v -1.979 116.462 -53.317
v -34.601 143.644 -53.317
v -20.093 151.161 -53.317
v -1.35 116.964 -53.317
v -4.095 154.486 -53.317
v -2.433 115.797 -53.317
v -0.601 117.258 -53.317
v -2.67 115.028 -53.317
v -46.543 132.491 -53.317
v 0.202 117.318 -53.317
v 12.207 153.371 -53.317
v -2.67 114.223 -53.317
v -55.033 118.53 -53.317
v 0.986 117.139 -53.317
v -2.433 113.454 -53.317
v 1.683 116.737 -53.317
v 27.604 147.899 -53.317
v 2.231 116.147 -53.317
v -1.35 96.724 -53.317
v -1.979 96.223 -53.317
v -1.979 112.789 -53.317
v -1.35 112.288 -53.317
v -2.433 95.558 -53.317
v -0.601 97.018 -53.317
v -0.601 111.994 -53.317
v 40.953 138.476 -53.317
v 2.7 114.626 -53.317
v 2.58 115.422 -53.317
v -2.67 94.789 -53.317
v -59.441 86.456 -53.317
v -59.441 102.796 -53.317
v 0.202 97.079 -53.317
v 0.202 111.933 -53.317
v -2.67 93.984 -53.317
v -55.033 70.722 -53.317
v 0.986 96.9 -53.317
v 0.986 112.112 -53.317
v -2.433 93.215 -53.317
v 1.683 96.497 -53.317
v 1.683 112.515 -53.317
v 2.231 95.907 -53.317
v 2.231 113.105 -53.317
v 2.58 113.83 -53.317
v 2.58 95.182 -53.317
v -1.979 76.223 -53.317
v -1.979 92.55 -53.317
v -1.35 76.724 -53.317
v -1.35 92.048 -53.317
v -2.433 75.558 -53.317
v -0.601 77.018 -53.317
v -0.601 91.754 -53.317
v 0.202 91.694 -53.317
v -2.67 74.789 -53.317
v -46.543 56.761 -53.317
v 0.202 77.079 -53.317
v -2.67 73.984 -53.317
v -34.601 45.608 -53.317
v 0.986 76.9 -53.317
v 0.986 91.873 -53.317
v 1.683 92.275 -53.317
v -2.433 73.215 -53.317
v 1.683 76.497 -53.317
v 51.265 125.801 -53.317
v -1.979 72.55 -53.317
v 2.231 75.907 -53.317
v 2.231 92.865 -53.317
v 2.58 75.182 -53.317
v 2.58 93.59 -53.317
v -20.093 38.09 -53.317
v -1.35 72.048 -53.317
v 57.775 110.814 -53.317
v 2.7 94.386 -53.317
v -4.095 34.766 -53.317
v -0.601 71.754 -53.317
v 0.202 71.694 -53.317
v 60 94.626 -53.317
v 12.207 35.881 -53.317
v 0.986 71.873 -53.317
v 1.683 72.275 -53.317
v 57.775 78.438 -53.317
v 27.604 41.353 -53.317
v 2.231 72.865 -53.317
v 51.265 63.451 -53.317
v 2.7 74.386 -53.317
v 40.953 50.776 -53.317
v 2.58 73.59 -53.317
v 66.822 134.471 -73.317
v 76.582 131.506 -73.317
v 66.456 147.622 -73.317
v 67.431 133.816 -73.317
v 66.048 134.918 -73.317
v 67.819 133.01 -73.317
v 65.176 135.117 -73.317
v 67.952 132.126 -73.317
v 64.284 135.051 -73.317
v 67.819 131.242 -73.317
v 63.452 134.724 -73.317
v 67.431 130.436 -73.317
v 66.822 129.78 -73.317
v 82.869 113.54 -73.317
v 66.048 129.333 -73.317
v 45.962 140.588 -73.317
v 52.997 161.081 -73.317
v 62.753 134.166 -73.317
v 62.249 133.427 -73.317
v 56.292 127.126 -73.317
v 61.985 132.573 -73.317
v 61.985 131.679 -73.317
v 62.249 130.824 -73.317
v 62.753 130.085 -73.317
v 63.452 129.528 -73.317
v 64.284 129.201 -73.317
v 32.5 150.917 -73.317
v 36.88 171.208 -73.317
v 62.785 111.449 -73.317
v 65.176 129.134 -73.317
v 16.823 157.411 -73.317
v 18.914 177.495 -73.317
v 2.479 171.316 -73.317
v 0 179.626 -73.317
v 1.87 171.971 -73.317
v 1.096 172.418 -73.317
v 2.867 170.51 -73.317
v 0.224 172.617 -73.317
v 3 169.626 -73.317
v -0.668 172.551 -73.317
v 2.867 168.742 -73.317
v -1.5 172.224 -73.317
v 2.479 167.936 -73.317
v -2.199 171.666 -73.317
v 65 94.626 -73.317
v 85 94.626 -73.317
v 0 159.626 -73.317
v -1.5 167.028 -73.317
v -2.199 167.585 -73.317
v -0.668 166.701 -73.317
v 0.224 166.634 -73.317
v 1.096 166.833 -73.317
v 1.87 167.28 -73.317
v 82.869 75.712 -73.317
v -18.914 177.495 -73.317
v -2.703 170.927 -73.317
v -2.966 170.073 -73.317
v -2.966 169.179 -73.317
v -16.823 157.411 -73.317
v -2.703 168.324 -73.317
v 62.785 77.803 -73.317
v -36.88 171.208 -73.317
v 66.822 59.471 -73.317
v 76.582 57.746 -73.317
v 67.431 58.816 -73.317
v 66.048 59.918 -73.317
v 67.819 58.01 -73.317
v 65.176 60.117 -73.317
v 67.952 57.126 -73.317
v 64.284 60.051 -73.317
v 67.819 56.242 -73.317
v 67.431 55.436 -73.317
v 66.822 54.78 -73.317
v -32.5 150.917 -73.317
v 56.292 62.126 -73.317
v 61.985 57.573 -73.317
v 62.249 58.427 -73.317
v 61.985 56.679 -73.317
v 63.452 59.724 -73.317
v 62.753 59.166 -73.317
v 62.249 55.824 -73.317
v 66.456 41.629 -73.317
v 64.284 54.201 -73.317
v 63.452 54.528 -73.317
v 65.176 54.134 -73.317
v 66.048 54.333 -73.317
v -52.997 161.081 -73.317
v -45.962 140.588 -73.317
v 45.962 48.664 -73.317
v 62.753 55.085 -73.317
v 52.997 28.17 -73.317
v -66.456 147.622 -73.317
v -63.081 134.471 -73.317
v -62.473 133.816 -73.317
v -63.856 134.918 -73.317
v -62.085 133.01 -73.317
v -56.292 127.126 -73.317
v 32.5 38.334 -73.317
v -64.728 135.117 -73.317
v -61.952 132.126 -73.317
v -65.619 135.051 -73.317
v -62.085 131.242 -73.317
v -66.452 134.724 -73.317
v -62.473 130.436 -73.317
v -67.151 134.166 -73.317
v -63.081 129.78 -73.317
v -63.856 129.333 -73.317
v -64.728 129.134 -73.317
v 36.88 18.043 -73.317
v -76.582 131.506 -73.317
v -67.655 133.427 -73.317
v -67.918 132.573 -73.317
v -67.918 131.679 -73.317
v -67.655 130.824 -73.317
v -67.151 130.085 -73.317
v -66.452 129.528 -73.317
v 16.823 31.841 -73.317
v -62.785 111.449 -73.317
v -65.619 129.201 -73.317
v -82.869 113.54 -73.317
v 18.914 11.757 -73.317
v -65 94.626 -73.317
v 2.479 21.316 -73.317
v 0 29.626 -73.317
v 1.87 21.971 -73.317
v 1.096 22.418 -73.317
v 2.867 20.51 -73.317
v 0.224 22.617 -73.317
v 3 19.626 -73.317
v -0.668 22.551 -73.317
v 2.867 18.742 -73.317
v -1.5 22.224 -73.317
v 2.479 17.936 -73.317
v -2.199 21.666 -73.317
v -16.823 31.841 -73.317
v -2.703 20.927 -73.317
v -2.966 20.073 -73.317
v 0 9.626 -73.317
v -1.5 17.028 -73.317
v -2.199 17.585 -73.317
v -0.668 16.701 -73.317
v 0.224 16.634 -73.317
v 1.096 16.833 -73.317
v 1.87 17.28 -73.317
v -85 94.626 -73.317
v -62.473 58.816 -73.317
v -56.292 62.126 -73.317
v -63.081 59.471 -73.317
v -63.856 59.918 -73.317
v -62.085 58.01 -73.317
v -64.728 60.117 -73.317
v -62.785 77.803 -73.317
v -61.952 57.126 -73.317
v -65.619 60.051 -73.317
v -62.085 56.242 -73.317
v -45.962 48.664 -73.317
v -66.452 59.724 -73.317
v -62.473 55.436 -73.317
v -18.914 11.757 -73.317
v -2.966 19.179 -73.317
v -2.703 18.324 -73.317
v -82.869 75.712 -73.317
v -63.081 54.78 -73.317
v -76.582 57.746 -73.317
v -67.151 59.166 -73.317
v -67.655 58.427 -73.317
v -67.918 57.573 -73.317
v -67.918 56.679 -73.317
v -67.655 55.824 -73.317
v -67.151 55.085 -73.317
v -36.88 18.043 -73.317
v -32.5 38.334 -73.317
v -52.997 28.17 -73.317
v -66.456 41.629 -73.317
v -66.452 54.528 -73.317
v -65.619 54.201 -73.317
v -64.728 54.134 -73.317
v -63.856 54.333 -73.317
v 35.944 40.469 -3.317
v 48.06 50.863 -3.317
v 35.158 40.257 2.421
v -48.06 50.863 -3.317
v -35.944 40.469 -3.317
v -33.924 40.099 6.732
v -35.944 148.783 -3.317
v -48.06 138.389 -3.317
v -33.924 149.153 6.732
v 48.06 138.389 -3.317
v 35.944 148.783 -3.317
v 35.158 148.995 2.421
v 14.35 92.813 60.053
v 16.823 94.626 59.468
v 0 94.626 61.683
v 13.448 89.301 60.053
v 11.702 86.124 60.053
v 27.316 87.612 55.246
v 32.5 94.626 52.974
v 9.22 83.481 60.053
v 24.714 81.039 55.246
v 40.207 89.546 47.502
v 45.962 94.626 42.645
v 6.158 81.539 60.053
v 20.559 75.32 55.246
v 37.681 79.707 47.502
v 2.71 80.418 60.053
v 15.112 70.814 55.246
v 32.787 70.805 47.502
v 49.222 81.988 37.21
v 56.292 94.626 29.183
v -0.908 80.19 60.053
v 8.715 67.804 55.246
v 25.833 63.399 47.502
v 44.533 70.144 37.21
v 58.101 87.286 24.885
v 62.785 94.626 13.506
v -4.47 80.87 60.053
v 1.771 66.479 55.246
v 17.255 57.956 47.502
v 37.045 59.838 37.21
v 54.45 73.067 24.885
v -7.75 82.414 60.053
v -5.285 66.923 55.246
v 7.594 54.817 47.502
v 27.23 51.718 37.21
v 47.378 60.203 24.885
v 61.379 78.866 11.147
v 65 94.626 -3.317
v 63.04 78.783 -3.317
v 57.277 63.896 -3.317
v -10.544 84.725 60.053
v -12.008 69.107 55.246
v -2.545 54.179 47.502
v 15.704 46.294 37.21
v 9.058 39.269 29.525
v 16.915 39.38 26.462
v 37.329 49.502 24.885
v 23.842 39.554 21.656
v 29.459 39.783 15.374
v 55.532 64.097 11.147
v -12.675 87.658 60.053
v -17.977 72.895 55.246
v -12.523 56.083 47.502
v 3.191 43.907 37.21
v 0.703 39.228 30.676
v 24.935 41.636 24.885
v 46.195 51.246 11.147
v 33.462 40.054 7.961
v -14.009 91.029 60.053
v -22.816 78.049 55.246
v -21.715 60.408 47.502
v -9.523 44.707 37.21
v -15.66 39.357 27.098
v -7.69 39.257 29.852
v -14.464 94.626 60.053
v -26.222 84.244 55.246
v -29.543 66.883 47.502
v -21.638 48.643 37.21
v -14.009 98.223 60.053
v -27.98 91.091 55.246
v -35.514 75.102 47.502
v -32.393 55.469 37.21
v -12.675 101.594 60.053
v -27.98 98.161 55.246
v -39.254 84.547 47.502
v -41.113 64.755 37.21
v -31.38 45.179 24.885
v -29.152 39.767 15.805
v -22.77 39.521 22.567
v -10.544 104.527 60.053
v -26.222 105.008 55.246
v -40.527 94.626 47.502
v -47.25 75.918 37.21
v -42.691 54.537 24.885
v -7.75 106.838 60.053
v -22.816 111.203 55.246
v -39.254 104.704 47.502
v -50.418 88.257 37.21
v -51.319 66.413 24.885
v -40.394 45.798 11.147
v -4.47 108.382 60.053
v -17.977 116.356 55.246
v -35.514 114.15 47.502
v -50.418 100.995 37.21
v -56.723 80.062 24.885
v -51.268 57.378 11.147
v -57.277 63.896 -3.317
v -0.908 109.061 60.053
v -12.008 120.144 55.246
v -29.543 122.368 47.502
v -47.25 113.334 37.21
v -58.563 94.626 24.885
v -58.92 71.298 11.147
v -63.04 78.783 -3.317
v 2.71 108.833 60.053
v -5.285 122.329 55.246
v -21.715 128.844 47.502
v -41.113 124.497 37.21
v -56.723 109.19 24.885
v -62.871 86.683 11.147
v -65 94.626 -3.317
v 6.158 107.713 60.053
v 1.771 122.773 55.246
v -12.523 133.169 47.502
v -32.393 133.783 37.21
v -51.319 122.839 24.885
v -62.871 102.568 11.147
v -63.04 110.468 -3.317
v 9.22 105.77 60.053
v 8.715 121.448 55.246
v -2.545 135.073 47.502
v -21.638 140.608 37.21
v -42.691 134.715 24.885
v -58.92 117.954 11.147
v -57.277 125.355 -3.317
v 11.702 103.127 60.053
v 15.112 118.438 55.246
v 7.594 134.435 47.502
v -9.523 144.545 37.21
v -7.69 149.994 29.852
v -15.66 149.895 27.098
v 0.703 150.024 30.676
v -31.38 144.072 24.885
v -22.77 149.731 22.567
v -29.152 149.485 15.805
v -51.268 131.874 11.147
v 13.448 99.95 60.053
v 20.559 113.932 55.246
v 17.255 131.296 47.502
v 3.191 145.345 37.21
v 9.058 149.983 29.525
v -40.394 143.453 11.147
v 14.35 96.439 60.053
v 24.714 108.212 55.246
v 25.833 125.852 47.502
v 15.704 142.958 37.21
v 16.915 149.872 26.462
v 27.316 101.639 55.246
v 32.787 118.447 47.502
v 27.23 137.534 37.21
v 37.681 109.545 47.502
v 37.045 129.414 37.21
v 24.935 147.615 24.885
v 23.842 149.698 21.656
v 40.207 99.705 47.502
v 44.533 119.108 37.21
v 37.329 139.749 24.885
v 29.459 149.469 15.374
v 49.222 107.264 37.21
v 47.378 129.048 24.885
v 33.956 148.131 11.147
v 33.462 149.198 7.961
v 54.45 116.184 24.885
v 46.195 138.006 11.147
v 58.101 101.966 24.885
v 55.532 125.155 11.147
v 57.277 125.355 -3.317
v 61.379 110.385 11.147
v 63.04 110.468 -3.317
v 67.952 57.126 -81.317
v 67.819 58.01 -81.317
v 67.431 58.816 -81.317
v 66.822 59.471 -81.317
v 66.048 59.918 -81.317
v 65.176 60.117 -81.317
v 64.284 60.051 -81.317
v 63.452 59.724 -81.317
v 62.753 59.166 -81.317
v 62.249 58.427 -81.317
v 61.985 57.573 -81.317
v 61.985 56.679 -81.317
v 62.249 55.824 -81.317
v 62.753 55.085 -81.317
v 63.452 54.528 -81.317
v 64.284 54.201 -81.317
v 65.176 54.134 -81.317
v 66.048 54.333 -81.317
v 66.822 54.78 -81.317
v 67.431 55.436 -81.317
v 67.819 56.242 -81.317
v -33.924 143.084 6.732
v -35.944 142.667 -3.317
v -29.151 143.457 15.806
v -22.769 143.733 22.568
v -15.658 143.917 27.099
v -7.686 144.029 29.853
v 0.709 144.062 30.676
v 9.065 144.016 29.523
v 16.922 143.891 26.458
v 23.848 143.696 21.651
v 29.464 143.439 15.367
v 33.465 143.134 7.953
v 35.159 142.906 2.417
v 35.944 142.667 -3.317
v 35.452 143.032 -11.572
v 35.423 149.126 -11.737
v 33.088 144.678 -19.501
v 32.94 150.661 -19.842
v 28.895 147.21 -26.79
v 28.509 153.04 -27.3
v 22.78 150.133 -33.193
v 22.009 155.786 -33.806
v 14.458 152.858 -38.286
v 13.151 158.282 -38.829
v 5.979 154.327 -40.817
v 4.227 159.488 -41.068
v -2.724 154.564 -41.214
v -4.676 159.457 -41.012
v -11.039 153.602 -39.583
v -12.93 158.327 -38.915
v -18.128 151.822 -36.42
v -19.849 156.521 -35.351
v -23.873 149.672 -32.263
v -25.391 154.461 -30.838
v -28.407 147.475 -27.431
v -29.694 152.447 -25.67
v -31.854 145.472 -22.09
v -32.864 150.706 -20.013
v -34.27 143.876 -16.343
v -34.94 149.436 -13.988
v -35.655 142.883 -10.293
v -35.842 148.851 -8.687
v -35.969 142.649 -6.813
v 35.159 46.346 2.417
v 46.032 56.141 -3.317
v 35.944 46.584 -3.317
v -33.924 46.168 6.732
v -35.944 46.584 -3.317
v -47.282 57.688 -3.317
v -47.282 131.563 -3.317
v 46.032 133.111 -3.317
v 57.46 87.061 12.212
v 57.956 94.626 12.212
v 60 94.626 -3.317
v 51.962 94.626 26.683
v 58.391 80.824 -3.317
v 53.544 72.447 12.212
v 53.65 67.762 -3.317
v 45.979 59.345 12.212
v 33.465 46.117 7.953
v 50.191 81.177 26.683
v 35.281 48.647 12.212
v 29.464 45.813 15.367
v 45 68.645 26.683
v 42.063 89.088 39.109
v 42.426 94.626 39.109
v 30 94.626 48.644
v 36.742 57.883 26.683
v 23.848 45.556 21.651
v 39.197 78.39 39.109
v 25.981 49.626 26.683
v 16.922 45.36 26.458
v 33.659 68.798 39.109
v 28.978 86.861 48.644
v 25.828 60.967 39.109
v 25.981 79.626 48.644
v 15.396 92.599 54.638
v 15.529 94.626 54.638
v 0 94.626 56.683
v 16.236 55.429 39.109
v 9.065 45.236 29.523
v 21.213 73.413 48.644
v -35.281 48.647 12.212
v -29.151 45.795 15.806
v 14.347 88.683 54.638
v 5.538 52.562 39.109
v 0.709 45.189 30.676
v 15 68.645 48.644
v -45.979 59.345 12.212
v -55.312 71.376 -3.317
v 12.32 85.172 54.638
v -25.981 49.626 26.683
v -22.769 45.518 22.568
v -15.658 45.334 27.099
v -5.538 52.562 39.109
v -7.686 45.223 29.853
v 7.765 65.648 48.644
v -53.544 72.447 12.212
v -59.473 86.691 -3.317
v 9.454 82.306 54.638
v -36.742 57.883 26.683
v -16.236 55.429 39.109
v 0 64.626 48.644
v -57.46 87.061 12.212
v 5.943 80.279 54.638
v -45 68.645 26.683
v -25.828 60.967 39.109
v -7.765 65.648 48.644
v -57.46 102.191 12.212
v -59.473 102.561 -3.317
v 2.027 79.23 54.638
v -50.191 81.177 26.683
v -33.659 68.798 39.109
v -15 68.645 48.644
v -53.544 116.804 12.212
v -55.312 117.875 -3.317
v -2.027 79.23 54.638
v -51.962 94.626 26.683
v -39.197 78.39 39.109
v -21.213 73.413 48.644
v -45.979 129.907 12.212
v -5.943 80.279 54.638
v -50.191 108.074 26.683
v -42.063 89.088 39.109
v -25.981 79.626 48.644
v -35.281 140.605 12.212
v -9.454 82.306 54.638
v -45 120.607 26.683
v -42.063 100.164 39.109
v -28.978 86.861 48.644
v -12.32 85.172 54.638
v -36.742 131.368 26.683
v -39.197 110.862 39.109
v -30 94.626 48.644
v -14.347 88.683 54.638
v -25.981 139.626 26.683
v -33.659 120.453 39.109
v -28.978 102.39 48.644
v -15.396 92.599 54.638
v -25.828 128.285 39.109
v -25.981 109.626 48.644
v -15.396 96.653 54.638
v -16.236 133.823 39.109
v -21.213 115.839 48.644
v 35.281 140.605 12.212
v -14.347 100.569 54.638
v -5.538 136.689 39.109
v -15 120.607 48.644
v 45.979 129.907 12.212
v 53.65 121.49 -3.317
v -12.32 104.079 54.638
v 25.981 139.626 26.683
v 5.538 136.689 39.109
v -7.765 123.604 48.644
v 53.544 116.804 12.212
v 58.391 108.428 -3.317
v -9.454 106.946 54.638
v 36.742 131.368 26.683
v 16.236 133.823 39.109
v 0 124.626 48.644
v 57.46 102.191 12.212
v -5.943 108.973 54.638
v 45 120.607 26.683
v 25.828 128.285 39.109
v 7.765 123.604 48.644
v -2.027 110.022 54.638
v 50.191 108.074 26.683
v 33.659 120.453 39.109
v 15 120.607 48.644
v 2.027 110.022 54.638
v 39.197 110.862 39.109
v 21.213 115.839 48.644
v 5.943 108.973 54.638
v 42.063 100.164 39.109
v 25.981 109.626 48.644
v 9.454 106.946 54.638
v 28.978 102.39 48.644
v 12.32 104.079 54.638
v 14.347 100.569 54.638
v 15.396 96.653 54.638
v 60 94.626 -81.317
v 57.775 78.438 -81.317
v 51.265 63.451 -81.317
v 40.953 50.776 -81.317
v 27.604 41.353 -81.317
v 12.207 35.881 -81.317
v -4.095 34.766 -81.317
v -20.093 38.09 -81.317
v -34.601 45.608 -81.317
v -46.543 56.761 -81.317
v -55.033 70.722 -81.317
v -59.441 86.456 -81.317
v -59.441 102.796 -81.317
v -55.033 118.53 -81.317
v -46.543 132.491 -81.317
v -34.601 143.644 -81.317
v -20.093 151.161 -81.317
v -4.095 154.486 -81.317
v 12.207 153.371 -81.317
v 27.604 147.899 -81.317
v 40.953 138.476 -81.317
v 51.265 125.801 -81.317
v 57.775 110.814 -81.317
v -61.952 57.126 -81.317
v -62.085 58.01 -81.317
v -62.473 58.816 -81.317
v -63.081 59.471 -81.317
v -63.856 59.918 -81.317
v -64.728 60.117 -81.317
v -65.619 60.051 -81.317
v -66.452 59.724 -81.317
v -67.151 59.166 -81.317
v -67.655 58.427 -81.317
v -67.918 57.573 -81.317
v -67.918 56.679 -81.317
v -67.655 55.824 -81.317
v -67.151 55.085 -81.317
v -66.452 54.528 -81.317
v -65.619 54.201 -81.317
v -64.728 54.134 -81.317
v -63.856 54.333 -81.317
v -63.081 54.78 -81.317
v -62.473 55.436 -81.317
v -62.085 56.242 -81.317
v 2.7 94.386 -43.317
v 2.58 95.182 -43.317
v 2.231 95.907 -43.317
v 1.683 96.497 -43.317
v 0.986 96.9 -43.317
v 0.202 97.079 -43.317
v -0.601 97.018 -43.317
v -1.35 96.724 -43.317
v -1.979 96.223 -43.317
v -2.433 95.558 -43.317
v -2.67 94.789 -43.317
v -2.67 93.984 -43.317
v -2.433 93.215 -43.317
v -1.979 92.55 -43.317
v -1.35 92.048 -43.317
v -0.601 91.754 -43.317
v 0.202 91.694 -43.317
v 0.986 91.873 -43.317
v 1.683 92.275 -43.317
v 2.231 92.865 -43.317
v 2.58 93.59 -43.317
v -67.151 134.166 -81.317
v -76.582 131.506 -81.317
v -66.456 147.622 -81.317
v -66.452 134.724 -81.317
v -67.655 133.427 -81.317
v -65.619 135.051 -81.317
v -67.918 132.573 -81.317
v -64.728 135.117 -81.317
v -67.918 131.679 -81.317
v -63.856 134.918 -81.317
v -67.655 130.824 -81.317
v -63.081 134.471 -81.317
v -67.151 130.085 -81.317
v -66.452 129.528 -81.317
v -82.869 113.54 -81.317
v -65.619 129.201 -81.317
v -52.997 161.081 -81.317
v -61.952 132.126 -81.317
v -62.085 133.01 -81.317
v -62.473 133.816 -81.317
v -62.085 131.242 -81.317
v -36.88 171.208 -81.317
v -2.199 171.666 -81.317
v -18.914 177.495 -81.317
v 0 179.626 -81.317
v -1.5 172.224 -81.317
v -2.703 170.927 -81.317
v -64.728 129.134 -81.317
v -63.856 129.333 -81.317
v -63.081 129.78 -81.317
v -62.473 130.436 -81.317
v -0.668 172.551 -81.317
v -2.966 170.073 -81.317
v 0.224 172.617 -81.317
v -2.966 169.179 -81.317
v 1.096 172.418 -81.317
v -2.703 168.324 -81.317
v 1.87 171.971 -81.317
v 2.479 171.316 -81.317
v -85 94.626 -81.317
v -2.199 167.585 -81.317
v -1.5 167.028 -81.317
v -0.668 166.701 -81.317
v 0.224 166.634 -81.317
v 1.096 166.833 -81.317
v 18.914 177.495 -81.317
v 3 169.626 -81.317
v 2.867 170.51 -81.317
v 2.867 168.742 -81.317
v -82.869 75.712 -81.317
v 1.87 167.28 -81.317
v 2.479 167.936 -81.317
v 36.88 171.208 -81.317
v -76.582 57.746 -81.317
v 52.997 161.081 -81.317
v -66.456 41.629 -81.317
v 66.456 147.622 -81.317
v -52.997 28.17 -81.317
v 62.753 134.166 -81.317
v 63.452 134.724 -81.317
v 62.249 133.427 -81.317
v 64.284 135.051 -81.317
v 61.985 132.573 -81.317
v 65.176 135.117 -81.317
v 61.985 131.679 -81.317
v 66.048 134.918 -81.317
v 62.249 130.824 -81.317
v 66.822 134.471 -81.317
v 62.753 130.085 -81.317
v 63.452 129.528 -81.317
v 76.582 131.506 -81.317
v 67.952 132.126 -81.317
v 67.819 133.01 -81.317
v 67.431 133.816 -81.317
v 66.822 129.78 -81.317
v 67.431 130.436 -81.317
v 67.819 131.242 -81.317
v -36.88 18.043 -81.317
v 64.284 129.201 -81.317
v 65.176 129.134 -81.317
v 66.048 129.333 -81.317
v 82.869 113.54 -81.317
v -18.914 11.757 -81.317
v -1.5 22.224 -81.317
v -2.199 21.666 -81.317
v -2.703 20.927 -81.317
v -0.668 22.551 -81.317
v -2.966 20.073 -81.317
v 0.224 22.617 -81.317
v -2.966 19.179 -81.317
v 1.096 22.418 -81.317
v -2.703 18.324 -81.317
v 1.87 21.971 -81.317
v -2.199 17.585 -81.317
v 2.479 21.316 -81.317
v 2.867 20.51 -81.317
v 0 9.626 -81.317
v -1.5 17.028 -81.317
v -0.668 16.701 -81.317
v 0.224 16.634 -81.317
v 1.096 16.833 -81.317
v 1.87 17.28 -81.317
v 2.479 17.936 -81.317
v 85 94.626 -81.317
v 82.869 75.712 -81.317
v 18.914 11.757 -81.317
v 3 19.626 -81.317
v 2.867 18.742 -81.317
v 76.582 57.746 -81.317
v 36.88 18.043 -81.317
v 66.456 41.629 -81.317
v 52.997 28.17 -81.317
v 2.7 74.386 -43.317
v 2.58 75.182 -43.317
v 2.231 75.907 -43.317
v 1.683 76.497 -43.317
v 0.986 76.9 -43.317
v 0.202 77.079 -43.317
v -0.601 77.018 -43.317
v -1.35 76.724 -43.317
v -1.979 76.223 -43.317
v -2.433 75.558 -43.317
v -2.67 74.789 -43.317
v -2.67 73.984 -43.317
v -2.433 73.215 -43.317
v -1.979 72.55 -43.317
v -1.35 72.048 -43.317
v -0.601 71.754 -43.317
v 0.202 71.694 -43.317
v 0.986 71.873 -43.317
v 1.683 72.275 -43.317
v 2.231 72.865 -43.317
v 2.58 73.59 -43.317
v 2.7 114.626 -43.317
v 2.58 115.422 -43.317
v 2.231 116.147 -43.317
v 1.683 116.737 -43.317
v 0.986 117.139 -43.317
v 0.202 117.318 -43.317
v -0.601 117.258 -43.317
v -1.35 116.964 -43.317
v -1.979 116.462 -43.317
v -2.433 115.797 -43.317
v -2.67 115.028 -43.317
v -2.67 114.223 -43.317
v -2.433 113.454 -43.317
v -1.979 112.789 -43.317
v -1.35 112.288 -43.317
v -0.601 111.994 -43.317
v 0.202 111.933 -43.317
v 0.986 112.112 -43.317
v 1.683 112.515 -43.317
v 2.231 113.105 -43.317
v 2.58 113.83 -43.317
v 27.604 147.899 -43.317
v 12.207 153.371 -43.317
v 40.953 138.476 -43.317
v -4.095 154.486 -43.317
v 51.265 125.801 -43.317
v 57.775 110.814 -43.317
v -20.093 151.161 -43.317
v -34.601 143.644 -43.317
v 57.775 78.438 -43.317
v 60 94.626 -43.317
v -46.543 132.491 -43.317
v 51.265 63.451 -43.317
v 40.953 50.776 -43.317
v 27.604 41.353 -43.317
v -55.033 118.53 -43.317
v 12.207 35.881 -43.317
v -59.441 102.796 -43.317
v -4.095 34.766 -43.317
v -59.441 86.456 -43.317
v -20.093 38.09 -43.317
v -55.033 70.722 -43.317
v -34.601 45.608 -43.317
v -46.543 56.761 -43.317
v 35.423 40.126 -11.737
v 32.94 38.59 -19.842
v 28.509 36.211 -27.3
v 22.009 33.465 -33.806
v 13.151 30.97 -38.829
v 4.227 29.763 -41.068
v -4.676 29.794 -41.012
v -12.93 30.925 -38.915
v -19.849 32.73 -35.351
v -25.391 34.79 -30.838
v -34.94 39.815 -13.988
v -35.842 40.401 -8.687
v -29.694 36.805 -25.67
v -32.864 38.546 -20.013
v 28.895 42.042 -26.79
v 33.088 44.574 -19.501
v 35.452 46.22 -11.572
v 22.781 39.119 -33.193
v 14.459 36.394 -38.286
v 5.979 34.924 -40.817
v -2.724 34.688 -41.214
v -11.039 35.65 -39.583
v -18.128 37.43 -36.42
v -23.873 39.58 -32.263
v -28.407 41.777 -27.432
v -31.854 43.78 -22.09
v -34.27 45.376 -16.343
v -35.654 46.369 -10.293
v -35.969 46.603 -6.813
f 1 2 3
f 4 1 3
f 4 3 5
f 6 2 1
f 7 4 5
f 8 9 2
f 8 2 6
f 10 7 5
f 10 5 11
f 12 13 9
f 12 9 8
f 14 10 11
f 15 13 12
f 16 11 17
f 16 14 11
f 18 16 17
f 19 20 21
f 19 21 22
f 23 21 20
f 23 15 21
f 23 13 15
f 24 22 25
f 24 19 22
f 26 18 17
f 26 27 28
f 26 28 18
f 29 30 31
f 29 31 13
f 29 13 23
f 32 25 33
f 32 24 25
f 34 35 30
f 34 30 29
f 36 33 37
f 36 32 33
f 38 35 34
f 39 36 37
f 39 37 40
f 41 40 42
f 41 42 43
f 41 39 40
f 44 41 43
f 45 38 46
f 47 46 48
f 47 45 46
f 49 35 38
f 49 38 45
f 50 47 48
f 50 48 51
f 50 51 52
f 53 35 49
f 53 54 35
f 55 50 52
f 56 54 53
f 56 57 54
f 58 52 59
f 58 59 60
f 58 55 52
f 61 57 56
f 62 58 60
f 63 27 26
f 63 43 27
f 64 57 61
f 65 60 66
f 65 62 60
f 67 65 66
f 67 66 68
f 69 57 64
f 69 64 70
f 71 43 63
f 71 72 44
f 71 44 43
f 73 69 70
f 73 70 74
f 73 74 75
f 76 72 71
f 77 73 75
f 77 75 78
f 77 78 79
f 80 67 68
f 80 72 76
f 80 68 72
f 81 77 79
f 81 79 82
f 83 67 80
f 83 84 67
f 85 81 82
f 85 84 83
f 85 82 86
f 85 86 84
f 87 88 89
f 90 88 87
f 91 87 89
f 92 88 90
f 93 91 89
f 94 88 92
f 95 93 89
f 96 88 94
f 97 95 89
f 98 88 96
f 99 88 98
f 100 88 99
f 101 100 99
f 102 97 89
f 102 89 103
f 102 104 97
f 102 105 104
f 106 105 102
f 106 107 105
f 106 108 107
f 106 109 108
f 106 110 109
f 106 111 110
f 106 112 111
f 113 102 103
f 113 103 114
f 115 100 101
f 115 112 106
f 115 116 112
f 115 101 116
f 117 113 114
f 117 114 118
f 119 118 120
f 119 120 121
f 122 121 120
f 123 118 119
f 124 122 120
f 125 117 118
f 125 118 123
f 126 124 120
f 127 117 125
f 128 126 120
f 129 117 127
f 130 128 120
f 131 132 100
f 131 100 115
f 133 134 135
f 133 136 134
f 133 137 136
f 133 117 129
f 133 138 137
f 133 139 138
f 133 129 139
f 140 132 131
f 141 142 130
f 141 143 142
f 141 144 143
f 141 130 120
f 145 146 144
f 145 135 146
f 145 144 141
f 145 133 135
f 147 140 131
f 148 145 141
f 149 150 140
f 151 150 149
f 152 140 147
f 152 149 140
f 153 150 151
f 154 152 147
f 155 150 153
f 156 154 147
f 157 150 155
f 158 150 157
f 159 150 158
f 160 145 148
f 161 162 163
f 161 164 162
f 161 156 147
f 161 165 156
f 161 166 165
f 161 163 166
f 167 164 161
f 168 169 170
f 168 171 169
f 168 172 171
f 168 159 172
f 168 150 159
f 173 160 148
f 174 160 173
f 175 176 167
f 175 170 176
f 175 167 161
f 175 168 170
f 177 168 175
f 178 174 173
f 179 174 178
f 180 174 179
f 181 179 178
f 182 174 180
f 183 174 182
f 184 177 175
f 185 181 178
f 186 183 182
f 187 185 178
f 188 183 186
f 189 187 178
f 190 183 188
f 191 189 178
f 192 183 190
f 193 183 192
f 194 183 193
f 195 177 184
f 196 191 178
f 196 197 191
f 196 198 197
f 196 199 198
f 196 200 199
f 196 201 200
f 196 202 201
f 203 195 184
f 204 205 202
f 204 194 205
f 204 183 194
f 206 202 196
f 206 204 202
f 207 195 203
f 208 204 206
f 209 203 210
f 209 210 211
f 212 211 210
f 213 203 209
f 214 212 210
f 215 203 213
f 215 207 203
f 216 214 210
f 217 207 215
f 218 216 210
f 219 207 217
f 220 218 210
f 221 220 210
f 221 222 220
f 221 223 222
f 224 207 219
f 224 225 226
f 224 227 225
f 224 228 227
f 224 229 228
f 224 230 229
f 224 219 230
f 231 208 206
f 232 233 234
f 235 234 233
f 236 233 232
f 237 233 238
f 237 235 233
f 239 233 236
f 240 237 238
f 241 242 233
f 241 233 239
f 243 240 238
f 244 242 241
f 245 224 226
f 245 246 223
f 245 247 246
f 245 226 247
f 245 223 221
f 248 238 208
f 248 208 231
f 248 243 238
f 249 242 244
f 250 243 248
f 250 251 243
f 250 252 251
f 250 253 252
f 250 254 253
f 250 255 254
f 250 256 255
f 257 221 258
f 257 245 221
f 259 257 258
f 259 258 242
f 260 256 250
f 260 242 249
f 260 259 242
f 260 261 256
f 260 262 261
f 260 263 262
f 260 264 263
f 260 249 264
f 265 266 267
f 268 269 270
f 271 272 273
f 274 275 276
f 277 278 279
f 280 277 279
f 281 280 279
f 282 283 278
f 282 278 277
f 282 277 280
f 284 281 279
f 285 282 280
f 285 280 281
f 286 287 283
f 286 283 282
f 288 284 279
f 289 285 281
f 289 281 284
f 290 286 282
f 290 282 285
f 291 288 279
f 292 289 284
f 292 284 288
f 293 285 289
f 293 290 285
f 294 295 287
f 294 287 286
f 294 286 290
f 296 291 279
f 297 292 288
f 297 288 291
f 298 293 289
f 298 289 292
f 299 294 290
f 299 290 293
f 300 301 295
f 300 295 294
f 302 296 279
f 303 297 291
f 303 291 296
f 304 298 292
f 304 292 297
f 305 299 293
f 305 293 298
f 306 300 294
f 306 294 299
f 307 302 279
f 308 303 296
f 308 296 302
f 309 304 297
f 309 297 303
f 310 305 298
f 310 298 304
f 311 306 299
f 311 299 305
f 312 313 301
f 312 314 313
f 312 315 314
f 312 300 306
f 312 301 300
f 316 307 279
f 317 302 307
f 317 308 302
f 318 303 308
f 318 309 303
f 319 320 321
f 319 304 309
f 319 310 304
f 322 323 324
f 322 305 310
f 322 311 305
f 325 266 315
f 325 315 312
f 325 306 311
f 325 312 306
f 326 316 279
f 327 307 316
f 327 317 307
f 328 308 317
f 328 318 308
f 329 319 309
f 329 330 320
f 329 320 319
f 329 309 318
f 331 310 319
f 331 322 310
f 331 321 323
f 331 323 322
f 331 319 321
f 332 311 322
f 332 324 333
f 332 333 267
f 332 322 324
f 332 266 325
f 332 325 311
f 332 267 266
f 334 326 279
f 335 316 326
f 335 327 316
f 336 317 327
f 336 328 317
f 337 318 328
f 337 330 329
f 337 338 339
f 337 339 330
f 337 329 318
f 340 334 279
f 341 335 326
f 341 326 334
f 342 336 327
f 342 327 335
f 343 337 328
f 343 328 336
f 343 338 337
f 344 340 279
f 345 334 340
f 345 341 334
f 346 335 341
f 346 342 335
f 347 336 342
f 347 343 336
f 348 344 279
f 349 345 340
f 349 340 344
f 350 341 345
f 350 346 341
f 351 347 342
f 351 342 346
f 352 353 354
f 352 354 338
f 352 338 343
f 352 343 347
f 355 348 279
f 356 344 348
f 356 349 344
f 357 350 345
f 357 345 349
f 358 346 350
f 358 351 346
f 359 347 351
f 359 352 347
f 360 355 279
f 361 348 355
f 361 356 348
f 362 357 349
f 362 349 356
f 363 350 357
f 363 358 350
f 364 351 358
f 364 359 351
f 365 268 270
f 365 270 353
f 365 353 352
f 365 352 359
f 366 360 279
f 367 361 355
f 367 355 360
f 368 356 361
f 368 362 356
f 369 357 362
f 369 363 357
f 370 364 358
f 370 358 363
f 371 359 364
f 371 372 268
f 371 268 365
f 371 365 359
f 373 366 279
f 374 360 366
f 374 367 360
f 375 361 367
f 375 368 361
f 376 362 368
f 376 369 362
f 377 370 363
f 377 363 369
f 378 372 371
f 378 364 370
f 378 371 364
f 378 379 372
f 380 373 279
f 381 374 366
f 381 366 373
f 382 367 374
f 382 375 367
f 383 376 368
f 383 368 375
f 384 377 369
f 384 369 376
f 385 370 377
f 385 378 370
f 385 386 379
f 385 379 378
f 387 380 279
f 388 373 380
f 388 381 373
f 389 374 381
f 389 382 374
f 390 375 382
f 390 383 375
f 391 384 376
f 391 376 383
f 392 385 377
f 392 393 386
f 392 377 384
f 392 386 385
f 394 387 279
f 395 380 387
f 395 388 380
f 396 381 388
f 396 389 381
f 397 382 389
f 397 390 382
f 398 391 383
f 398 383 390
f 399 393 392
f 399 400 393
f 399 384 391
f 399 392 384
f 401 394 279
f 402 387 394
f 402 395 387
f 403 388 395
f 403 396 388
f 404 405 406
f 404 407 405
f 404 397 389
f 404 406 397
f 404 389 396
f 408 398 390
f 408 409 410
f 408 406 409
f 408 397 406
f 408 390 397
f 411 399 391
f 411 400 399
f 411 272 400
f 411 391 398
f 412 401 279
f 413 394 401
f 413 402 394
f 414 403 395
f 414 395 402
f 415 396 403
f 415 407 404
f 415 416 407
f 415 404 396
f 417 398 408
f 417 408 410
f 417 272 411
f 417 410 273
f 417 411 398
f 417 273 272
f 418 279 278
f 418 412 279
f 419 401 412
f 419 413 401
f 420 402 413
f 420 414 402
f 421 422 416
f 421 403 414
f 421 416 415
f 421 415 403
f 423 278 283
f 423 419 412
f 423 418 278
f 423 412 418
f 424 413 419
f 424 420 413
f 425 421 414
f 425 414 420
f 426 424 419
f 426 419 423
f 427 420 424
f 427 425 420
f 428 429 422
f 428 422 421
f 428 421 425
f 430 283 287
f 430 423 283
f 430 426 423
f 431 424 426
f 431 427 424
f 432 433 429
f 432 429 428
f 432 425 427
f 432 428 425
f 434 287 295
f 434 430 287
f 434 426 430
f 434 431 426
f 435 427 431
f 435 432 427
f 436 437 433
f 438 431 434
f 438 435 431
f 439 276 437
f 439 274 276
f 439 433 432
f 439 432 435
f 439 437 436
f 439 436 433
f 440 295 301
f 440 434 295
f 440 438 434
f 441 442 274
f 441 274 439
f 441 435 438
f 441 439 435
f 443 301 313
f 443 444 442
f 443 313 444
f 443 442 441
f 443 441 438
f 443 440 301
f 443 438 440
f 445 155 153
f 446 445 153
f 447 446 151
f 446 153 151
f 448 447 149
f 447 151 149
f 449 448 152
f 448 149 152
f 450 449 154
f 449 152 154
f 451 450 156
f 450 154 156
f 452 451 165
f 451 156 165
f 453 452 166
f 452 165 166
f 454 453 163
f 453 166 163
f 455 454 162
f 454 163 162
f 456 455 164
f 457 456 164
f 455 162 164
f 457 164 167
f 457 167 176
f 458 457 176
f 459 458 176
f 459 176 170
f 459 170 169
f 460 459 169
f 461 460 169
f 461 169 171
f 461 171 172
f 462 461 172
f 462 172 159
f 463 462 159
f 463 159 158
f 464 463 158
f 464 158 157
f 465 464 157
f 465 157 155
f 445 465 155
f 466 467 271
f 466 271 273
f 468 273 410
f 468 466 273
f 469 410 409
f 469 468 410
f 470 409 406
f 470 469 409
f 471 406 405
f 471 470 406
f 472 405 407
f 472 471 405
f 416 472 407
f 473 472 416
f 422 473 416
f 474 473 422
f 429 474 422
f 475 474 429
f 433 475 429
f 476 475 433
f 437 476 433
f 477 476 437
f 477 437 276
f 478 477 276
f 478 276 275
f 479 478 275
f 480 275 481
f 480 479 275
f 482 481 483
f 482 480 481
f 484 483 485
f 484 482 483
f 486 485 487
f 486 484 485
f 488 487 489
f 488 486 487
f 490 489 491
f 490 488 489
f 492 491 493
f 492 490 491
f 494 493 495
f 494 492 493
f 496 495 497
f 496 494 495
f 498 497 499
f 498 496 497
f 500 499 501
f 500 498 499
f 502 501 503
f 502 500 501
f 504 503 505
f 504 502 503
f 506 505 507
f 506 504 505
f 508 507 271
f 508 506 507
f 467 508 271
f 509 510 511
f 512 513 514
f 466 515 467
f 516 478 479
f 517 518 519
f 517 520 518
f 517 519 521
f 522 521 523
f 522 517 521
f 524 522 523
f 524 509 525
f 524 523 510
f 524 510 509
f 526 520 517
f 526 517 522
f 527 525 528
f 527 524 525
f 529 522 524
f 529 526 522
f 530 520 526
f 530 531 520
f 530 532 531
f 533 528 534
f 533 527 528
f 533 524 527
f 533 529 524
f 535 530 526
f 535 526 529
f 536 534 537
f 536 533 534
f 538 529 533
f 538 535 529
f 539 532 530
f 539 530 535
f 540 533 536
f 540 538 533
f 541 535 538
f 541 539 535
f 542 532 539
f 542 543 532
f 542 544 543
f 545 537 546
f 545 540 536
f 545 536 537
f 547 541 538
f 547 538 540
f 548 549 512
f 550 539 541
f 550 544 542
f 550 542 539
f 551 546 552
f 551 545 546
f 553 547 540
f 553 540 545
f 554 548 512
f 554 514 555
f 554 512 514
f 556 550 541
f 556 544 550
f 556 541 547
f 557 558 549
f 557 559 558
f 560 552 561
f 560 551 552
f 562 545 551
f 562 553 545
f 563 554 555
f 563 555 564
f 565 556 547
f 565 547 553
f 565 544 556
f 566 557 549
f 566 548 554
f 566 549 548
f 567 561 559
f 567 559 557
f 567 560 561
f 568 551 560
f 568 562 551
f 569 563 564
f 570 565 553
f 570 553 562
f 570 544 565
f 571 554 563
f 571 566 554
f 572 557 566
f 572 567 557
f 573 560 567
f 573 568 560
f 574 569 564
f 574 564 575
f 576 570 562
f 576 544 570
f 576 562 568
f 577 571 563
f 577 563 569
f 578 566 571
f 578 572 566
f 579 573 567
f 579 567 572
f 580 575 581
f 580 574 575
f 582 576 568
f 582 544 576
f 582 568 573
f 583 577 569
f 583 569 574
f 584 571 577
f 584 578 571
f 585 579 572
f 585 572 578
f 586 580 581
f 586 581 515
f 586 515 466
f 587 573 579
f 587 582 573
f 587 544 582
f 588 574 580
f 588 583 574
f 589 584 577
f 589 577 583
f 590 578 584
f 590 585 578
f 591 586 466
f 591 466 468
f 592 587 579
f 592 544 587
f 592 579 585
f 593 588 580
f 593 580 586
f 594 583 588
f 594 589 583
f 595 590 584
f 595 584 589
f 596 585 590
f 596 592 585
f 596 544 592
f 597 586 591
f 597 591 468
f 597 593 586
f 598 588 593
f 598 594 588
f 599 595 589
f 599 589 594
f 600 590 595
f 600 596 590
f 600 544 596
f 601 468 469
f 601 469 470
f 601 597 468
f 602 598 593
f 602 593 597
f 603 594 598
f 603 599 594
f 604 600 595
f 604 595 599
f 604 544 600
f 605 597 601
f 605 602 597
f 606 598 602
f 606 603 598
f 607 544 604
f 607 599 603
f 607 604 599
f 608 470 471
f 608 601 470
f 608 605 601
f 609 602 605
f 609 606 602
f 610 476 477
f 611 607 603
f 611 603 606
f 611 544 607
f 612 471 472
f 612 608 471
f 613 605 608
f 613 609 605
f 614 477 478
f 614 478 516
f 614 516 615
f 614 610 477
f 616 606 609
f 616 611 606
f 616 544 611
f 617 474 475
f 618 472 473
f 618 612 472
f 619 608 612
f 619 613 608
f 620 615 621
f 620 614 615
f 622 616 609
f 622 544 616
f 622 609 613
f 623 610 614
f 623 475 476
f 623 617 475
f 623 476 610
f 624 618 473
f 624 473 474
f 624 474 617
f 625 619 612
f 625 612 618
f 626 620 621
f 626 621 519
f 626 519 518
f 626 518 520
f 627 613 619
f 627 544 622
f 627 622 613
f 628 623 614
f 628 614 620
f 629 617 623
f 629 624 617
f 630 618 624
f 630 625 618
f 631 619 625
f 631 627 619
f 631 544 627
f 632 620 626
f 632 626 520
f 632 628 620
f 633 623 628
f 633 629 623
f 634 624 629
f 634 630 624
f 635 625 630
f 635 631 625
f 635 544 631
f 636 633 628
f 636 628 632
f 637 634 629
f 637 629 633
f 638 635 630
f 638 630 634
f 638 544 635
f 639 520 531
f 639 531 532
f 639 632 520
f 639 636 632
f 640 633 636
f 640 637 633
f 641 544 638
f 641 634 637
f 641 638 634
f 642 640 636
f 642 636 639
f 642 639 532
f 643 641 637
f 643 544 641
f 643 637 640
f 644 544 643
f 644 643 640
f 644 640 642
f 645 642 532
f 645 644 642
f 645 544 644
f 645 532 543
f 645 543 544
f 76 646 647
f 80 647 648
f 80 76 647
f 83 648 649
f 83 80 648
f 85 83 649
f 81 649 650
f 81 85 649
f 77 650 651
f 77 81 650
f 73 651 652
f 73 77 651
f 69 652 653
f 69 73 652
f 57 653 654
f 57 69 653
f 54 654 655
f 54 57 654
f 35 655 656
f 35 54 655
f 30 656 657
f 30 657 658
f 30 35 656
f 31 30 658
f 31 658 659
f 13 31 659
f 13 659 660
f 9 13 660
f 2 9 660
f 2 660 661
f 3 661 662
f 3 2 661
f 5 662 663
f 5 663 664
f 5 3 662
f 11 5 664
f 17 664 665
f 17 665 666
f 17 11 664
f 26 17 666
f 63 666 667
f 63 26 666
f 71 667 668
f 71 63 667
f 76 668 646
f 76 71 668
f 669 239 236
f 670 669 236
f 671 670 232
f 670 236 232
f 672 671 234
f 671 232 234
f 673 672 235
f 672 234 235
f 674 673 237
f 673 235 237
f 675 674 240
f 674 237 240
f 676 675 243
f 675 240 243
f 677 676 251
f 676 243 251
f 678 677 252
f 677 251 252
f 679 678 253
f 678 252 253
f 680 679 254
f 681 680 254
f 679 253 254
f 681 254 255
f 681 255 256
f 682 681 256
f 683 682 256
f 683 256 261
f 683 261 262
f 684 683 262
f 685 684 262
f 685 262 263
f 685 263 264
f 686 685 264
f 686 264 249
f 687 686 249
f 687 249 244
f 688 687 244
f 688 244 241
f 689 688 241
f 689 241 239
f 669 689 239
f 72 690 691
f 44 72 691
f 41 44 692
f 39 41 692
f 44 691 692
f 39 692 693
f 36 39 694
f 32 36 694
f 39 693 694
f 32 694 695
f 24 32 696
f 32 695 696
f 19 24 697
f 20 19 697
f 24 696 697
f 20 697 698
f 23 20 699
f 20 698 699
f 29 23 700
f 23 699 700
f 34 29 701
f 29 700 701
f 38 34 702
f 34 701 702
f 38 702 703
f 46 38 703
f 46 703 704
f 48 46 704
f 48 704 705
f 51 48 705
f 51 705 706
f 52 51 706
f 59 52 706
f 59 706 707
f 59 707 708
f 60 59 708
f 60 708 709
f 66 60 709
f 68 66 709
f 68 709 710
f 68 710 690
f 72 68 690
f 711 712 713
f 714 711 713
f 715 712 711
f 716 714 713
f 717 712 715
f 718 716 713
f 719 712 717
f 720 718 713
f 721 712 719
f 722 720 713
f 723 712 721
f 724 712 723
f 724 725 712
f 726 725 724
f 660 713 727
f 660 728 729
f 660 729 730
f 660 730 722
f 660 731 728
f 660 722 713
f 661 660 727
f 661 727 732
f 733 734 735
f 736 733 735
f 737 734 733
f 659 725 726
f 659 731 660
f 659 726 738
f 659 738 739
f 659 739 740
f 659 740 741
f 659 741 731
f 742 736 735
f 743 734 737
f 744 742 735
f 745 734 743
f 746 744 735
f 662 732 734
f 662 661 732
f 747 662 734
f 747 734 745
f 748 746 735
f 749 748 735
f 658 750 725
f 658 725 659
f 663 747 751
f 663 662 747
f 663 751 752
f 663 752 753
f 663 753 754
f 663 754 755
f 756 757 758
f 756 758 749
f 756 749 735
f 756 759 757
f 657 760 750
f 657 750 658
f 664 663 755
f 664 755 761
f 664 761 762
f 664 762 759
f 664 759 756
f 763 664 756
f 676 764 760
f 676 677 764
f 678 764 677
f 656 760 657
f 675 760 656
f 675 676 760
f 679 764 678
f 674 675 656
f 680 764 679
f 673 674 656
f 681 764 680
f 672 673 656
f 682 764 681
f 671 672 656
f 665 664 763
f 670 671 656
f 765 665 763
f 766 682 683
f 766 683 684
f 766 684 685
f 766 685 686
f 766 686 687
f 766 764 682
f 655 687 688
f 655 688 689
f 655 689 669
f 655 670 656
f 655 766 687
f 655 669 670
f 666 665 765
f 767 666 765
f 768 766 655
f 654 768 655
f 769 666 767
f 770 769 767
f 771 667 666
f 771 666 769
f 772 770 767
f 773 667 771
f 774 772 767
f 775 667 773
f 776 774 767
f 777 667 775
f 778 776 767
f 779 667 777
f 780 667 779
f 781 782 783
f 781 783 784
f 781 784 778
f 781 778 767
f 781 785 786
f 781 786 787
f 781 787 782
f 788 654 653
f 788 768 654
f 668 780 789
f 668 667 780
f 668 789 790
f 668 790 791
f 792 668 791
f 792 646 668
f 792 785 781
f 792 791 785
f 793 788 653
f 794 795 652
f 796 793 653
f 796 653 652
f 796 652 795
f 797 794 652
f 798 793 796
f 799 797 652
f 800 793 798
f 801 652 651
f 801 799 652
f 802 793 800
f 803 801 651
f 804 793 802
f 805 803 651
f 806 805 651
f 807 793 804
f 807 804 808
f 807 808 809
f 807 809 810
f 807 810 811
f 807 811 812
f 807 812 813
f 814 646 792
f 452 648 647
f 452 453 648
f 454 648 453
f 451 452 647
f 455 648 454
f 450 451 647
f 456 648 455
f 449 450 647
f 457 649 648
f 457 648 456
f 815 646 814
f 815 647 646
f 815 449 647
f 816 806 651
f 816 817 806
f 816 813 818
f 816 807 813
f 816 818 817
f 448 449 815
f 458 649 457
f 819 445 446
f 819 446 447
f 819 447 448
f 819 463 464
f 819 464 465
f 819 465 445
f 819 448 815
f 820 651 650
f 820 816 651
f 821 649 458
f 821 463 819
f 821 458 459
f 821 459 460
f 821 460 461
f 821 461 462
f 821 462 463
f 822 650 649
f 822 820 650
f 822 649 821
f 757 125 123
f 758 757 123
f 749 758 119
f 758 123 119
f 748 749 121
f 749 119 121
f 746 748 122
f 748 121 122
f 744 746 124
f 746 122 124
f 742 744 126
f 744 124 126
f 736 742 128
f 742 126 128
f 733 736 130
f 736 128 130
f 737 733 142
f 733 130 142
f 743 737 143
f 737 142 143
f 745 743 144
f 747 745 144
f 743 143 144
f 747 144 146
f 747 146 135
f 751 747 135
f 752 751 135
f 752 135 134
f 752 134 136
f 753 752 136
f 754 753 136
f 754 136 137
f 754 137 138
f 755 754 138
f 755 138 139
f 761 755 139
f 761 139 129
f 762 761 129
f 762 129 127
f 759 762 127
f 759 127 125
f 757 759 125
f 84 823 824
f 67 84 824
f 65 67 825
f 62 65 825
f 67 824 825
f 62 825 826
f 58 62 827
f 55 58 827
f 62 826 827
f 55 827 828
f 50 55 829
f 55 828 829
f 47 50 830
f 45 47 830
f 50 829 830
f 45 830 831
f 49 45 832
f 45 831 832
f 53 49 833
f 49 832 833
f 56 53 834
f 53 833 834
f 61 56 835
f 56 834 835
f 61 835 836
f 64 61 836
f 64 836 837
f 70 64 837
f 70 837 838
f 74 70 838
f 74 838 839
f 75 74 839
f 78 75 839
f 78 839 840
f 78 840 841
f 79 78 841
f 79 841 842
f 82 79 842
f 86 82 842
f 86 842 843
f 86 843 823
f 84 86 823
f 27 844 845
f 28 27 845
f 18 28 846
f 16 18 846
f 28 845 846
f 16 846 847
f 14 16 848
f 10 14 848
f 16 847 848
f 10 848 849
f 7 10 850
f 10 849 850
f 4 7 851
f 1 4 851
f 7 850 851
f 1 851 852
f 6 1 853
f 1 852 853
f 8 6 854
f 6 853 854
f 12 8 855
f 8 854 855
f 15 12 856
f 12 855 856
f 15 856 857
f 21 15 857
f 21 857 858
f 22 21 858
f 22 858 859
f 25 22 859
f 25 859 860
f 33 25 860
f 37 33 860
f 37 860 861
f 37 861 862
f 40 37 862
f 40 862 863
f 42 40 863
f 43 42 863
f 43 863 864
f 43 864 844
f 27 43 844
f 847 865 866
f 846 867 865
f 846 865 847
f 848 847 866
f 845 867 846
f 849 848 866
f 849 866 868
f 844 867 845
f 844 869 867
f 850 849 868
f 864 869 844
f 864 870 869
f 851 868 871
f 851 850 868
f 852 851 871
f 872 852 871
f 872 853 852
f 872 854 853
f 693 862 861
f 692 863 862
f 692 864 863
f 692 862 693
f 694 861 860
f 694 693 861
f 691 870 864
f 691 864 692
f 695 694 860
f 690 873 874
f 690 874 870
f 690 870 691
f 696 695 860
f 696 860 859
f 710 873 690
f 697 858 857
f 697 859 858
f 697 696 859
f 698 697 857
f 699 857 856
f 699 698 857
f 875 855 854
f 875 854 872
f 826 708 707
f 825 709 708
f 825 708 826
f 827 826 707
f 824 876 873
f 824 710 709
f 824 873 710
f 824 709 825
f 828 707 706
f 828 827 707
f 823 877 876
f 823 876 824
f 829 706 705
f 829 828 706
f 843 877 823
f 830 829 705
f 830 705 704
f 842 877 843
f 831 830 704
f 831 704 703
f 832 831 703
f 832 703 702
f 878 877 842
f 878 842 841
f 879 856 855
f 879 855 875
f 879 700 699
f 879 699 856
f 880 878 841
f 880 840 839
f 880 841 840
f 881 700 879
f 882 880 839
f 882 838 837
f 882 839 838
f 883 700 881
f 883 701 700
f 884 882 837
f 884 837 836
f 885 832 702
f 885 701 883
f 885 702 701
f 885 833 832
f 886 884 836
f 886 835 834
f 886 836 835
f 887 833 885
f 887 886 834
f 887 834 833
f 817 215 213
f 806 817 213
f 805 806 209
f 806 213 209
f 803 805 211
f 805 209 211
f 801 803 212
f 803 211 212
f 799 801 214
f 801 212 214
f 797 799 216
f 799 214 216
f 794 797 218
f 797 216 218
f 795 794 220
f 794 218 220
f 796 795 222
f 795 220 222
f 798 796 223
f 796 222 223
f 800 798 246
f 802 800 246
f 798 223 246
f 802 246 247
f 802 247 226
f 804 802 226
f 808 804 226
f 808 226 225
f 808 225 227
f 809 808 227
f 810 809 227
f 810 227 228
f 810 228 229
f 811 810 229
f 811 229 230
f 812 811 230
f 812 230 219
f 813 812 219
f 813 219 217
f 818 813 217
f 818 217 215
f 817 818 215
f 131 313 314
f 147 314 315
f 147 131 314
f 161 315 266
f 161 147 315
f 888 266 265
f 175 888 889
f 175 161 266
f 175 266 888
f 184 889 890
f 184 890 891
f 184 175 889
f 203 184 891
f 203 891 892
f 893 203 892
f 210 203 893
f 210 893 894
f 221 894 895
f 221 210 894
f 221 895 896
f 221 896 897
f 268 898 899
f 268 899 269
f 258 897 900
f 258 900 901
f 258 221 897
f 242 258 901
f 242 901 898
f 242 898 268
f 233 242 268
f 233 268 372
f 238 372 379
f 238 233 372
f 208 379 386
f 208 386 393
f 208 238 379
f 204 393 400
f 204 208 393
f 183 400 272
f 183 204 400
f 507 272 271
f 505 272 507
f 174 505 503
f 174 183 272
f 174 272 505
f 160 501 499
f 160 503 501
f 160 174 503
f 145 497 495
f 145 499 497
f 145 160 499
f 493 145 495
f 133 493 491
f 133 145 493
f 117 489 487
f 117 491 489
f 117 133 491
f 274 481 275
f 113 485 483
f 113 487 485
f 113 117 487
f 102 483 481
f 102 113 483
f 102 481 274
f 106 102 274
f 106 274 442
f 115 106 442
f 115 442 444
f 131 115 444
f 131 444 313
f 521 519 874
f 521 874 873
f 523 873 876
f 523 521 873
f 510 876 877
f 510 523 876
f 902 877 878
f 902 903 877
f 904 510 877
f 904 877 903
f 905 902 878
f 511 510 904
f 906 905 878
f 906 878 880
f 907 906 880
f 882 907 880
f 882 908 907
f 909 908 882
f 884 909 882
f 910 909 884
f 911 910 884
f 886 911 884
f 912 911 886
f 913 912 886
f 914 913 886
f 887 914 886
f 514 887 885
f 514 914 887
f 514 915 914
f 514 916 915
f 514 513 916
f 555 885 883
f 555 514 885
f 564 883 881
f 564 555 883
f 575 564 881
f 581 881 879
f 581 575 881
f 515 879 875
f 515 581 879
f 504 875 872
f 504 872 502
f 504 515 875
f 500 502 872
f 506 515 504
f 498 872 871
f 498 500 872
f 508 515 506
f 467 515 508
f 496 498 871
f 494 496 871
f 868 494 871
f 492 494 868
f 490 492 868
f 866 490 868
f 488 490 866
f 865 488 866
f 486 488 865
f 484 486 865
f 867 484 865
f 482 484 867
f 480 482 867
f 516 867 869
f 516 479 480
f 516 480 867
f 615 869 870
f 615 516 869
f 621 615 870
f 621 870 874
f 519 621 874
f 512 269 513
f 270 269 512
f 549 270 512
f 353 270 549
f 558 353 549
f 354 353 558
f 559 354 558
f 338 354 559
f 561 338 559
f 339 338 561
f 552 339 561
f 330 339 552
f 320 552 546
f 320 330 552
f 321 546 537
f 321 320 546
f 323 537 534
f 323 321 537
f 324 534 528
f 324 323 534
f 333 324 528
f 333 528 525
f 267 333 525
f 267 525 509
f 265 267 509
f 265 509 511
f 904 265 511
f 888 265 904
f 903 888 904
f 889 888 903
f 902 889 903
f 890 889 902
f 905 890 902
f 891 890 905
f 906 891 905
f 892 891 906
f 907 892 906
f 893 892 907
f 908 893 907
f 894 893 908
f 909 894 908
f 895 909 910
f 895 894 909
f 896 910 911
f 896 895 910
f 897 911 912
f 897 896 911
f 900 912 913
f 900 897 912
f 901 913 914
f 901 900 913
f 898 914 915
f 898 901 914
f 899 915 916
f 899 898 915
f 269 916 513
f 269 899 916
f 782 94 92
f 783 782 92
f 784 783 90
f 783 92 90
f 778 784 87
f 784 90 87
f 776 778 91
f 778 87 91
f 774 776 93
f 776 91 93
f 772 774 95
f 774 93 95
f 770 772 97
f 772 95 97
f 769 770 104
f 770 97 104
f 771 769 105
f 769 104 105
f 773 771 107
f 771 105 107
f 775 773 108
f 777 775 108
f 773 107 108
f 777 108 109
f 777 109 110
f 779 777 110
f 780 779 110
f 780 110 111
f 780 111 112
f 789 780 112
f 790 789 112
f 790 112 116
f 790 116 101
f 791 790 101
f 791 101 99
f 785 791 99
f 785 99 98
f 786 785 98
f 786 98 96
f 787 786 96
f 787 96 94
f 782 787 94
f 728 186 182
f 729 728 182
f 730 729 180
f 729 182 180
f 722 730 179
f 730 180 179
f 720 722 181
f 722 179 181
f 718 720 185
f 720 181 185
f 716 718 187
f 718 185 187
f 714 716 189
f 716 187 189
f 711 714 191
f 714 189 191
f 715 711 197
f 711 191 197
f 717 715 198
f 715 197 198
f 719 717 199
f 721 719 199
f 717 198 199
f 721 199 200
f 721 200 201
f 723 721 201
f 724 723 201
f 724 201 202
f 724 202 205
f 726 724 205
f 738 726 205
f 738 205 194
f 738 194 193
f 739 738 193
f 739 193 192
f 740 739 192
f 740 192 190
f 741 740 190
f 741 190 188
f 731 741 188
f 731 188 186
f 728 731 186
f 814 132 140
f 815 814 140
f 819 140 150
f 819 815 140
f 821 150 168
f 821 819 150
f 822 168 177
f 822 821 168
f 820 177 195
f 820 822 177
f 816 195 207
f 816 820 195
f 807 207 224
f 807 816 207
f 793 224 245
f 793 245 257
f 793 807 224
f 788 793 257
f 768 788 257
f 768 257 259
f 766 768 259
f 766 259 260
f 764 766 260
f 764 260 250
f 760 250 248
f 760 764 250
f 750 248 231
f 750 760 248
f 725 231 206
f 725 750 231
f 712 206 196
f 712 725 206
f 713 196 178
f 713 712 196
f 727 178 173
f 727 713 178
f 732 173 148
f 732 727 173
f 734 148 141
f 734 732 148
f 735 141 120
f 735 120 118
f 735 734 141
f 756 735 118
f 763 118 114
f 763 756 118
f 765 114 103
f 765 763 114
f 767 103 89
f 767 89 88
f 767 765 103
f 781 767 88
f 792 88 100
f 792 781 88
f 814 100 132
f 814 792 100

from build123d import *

# Parameters (mm, degrees)
SKETCH_5_R          = 36
CUT_EXTRUDE_1_DEPTH = 191
SKETCH_6_R          = 3
CUT_EXTRUDE_3_DEPTH = 225
SKETCH_7_R          = 2.7
CUT_EXTRUDE_4_DEPTH = 111


with BuildPart() as part:
    # 草图1 → 旋转6 (revolve)
    with BuildSketch(Plane(origin=(0, 0, 0), x_dir=(0, 0, -1), z_dir=(1, 0, 0)), mode=Mode.PRIVATE) as revolve_6_sk:
        with BuildLine():
            Line((3.317174788, 159.625816033), (43.317174788, 159.625816033))
            Line((43.317174788, 159.625816033), (73.317174788, 159.625816033))
            Line((73.317174788, 159.625816033), (73.317174788, 179.625816033))
            Line((73.317174788, 179.625816033), (81.317174788, 179.625816033))
            Line((81.317174788, 179.625816033), (81.317174788, 154.625816033))
            Line((81.317174788, 154.625816033), (73.317174788, 154.625816033))
            Line((73.317174788, 154.625816033), (53.317174788, 154.625816033))
            Line((53.317174788, 154.625816033), (53.317174788, 94.625816033))
            Line((53.317174788, 94.625816033), (43.317174788, 94.625816033))
            Line((43.317174788, 94.625816033), (43.317174788, 154.625816033))
            Line((43.317174788, 154.625816033), (3.317174788, 154.625816033))
            ThreePointArc((3.317174788, 154.625816033), (-39.109232083, 137.052222904), (-56.682825212, 94.625816033))
            Line((-56.682825212, 94.625816033), (-61.682825212, 94.625816033))
            ThreePointArc((-61.682825212, 94.625816033), (-42.644765989, 140.58775681), (3.317174788, 159.625816033))
        make_face()
    revolve(revolve_6_sk.sketch.rotate(Axis((0, 94.625816033, -43.317174788), (0, 0, -1)), 90), axis=Axis((0, 94.625816033, -43.317174788), (0, 0, -1)))

    # 草图5 → 切除-拉伸1 (cut)
    with BuildSketch(Plane(origin=(0, 0, 0), x_dir=(1, 0, 0), z_dir=(0, 1, 0))):
        with Locations(Location((0, 5.317174788, 0), (0, 0, 183.184738537))):
            Circle(SKETCH_5_R)
    extrude(amount=CUT_EXTRUDE_1_DEPTH, mode=Mode.SUBTRACT)

    # 草图6 → 切除-拉伸3 (cut)
    with BuildSketch(Plane.XY):
        with Locations((0, 169.625816033)):
            Circle(SKETCH_6_R)
        with Locations((0, 19.625816033)):
            Circle(SKETCH_6_R)
        with Locations((64.951905284, 132.125816033)):
            Circle(SKETCH_6_R)
        with Locations((64.951905284, 57.125816033)):
            Circle(SKETCH_6_R)
        with Locations((-64.951905284, 132.125816033)):
            Circle(SKETCH_6_R)
        with Locations((-64.951905284, 57.125816033)):
            Circle(SKETCH_6_R)
    extrude(amount=-CUT_EXTRUDE_3_DEPTH, mode=Mode.SUBTRACT)

    # 草图7 → 切除-拉伸4 (cut)
    with BuildSketch(Plane.XY):
        with Locations((0, 94.386174491)):
            Circle(SKETCH_7_R)
        with Locations((0, 114.625816033)):
            Circle(SKETCH_7_R)
        with Locations((0, 74.386174491)):
            Circle(SKETCH_7_R)
    extrude(amount=-CUT_EXTRUDE_4_DEPTH, mode=Mode.SUBTRACT)


solid = part.part
